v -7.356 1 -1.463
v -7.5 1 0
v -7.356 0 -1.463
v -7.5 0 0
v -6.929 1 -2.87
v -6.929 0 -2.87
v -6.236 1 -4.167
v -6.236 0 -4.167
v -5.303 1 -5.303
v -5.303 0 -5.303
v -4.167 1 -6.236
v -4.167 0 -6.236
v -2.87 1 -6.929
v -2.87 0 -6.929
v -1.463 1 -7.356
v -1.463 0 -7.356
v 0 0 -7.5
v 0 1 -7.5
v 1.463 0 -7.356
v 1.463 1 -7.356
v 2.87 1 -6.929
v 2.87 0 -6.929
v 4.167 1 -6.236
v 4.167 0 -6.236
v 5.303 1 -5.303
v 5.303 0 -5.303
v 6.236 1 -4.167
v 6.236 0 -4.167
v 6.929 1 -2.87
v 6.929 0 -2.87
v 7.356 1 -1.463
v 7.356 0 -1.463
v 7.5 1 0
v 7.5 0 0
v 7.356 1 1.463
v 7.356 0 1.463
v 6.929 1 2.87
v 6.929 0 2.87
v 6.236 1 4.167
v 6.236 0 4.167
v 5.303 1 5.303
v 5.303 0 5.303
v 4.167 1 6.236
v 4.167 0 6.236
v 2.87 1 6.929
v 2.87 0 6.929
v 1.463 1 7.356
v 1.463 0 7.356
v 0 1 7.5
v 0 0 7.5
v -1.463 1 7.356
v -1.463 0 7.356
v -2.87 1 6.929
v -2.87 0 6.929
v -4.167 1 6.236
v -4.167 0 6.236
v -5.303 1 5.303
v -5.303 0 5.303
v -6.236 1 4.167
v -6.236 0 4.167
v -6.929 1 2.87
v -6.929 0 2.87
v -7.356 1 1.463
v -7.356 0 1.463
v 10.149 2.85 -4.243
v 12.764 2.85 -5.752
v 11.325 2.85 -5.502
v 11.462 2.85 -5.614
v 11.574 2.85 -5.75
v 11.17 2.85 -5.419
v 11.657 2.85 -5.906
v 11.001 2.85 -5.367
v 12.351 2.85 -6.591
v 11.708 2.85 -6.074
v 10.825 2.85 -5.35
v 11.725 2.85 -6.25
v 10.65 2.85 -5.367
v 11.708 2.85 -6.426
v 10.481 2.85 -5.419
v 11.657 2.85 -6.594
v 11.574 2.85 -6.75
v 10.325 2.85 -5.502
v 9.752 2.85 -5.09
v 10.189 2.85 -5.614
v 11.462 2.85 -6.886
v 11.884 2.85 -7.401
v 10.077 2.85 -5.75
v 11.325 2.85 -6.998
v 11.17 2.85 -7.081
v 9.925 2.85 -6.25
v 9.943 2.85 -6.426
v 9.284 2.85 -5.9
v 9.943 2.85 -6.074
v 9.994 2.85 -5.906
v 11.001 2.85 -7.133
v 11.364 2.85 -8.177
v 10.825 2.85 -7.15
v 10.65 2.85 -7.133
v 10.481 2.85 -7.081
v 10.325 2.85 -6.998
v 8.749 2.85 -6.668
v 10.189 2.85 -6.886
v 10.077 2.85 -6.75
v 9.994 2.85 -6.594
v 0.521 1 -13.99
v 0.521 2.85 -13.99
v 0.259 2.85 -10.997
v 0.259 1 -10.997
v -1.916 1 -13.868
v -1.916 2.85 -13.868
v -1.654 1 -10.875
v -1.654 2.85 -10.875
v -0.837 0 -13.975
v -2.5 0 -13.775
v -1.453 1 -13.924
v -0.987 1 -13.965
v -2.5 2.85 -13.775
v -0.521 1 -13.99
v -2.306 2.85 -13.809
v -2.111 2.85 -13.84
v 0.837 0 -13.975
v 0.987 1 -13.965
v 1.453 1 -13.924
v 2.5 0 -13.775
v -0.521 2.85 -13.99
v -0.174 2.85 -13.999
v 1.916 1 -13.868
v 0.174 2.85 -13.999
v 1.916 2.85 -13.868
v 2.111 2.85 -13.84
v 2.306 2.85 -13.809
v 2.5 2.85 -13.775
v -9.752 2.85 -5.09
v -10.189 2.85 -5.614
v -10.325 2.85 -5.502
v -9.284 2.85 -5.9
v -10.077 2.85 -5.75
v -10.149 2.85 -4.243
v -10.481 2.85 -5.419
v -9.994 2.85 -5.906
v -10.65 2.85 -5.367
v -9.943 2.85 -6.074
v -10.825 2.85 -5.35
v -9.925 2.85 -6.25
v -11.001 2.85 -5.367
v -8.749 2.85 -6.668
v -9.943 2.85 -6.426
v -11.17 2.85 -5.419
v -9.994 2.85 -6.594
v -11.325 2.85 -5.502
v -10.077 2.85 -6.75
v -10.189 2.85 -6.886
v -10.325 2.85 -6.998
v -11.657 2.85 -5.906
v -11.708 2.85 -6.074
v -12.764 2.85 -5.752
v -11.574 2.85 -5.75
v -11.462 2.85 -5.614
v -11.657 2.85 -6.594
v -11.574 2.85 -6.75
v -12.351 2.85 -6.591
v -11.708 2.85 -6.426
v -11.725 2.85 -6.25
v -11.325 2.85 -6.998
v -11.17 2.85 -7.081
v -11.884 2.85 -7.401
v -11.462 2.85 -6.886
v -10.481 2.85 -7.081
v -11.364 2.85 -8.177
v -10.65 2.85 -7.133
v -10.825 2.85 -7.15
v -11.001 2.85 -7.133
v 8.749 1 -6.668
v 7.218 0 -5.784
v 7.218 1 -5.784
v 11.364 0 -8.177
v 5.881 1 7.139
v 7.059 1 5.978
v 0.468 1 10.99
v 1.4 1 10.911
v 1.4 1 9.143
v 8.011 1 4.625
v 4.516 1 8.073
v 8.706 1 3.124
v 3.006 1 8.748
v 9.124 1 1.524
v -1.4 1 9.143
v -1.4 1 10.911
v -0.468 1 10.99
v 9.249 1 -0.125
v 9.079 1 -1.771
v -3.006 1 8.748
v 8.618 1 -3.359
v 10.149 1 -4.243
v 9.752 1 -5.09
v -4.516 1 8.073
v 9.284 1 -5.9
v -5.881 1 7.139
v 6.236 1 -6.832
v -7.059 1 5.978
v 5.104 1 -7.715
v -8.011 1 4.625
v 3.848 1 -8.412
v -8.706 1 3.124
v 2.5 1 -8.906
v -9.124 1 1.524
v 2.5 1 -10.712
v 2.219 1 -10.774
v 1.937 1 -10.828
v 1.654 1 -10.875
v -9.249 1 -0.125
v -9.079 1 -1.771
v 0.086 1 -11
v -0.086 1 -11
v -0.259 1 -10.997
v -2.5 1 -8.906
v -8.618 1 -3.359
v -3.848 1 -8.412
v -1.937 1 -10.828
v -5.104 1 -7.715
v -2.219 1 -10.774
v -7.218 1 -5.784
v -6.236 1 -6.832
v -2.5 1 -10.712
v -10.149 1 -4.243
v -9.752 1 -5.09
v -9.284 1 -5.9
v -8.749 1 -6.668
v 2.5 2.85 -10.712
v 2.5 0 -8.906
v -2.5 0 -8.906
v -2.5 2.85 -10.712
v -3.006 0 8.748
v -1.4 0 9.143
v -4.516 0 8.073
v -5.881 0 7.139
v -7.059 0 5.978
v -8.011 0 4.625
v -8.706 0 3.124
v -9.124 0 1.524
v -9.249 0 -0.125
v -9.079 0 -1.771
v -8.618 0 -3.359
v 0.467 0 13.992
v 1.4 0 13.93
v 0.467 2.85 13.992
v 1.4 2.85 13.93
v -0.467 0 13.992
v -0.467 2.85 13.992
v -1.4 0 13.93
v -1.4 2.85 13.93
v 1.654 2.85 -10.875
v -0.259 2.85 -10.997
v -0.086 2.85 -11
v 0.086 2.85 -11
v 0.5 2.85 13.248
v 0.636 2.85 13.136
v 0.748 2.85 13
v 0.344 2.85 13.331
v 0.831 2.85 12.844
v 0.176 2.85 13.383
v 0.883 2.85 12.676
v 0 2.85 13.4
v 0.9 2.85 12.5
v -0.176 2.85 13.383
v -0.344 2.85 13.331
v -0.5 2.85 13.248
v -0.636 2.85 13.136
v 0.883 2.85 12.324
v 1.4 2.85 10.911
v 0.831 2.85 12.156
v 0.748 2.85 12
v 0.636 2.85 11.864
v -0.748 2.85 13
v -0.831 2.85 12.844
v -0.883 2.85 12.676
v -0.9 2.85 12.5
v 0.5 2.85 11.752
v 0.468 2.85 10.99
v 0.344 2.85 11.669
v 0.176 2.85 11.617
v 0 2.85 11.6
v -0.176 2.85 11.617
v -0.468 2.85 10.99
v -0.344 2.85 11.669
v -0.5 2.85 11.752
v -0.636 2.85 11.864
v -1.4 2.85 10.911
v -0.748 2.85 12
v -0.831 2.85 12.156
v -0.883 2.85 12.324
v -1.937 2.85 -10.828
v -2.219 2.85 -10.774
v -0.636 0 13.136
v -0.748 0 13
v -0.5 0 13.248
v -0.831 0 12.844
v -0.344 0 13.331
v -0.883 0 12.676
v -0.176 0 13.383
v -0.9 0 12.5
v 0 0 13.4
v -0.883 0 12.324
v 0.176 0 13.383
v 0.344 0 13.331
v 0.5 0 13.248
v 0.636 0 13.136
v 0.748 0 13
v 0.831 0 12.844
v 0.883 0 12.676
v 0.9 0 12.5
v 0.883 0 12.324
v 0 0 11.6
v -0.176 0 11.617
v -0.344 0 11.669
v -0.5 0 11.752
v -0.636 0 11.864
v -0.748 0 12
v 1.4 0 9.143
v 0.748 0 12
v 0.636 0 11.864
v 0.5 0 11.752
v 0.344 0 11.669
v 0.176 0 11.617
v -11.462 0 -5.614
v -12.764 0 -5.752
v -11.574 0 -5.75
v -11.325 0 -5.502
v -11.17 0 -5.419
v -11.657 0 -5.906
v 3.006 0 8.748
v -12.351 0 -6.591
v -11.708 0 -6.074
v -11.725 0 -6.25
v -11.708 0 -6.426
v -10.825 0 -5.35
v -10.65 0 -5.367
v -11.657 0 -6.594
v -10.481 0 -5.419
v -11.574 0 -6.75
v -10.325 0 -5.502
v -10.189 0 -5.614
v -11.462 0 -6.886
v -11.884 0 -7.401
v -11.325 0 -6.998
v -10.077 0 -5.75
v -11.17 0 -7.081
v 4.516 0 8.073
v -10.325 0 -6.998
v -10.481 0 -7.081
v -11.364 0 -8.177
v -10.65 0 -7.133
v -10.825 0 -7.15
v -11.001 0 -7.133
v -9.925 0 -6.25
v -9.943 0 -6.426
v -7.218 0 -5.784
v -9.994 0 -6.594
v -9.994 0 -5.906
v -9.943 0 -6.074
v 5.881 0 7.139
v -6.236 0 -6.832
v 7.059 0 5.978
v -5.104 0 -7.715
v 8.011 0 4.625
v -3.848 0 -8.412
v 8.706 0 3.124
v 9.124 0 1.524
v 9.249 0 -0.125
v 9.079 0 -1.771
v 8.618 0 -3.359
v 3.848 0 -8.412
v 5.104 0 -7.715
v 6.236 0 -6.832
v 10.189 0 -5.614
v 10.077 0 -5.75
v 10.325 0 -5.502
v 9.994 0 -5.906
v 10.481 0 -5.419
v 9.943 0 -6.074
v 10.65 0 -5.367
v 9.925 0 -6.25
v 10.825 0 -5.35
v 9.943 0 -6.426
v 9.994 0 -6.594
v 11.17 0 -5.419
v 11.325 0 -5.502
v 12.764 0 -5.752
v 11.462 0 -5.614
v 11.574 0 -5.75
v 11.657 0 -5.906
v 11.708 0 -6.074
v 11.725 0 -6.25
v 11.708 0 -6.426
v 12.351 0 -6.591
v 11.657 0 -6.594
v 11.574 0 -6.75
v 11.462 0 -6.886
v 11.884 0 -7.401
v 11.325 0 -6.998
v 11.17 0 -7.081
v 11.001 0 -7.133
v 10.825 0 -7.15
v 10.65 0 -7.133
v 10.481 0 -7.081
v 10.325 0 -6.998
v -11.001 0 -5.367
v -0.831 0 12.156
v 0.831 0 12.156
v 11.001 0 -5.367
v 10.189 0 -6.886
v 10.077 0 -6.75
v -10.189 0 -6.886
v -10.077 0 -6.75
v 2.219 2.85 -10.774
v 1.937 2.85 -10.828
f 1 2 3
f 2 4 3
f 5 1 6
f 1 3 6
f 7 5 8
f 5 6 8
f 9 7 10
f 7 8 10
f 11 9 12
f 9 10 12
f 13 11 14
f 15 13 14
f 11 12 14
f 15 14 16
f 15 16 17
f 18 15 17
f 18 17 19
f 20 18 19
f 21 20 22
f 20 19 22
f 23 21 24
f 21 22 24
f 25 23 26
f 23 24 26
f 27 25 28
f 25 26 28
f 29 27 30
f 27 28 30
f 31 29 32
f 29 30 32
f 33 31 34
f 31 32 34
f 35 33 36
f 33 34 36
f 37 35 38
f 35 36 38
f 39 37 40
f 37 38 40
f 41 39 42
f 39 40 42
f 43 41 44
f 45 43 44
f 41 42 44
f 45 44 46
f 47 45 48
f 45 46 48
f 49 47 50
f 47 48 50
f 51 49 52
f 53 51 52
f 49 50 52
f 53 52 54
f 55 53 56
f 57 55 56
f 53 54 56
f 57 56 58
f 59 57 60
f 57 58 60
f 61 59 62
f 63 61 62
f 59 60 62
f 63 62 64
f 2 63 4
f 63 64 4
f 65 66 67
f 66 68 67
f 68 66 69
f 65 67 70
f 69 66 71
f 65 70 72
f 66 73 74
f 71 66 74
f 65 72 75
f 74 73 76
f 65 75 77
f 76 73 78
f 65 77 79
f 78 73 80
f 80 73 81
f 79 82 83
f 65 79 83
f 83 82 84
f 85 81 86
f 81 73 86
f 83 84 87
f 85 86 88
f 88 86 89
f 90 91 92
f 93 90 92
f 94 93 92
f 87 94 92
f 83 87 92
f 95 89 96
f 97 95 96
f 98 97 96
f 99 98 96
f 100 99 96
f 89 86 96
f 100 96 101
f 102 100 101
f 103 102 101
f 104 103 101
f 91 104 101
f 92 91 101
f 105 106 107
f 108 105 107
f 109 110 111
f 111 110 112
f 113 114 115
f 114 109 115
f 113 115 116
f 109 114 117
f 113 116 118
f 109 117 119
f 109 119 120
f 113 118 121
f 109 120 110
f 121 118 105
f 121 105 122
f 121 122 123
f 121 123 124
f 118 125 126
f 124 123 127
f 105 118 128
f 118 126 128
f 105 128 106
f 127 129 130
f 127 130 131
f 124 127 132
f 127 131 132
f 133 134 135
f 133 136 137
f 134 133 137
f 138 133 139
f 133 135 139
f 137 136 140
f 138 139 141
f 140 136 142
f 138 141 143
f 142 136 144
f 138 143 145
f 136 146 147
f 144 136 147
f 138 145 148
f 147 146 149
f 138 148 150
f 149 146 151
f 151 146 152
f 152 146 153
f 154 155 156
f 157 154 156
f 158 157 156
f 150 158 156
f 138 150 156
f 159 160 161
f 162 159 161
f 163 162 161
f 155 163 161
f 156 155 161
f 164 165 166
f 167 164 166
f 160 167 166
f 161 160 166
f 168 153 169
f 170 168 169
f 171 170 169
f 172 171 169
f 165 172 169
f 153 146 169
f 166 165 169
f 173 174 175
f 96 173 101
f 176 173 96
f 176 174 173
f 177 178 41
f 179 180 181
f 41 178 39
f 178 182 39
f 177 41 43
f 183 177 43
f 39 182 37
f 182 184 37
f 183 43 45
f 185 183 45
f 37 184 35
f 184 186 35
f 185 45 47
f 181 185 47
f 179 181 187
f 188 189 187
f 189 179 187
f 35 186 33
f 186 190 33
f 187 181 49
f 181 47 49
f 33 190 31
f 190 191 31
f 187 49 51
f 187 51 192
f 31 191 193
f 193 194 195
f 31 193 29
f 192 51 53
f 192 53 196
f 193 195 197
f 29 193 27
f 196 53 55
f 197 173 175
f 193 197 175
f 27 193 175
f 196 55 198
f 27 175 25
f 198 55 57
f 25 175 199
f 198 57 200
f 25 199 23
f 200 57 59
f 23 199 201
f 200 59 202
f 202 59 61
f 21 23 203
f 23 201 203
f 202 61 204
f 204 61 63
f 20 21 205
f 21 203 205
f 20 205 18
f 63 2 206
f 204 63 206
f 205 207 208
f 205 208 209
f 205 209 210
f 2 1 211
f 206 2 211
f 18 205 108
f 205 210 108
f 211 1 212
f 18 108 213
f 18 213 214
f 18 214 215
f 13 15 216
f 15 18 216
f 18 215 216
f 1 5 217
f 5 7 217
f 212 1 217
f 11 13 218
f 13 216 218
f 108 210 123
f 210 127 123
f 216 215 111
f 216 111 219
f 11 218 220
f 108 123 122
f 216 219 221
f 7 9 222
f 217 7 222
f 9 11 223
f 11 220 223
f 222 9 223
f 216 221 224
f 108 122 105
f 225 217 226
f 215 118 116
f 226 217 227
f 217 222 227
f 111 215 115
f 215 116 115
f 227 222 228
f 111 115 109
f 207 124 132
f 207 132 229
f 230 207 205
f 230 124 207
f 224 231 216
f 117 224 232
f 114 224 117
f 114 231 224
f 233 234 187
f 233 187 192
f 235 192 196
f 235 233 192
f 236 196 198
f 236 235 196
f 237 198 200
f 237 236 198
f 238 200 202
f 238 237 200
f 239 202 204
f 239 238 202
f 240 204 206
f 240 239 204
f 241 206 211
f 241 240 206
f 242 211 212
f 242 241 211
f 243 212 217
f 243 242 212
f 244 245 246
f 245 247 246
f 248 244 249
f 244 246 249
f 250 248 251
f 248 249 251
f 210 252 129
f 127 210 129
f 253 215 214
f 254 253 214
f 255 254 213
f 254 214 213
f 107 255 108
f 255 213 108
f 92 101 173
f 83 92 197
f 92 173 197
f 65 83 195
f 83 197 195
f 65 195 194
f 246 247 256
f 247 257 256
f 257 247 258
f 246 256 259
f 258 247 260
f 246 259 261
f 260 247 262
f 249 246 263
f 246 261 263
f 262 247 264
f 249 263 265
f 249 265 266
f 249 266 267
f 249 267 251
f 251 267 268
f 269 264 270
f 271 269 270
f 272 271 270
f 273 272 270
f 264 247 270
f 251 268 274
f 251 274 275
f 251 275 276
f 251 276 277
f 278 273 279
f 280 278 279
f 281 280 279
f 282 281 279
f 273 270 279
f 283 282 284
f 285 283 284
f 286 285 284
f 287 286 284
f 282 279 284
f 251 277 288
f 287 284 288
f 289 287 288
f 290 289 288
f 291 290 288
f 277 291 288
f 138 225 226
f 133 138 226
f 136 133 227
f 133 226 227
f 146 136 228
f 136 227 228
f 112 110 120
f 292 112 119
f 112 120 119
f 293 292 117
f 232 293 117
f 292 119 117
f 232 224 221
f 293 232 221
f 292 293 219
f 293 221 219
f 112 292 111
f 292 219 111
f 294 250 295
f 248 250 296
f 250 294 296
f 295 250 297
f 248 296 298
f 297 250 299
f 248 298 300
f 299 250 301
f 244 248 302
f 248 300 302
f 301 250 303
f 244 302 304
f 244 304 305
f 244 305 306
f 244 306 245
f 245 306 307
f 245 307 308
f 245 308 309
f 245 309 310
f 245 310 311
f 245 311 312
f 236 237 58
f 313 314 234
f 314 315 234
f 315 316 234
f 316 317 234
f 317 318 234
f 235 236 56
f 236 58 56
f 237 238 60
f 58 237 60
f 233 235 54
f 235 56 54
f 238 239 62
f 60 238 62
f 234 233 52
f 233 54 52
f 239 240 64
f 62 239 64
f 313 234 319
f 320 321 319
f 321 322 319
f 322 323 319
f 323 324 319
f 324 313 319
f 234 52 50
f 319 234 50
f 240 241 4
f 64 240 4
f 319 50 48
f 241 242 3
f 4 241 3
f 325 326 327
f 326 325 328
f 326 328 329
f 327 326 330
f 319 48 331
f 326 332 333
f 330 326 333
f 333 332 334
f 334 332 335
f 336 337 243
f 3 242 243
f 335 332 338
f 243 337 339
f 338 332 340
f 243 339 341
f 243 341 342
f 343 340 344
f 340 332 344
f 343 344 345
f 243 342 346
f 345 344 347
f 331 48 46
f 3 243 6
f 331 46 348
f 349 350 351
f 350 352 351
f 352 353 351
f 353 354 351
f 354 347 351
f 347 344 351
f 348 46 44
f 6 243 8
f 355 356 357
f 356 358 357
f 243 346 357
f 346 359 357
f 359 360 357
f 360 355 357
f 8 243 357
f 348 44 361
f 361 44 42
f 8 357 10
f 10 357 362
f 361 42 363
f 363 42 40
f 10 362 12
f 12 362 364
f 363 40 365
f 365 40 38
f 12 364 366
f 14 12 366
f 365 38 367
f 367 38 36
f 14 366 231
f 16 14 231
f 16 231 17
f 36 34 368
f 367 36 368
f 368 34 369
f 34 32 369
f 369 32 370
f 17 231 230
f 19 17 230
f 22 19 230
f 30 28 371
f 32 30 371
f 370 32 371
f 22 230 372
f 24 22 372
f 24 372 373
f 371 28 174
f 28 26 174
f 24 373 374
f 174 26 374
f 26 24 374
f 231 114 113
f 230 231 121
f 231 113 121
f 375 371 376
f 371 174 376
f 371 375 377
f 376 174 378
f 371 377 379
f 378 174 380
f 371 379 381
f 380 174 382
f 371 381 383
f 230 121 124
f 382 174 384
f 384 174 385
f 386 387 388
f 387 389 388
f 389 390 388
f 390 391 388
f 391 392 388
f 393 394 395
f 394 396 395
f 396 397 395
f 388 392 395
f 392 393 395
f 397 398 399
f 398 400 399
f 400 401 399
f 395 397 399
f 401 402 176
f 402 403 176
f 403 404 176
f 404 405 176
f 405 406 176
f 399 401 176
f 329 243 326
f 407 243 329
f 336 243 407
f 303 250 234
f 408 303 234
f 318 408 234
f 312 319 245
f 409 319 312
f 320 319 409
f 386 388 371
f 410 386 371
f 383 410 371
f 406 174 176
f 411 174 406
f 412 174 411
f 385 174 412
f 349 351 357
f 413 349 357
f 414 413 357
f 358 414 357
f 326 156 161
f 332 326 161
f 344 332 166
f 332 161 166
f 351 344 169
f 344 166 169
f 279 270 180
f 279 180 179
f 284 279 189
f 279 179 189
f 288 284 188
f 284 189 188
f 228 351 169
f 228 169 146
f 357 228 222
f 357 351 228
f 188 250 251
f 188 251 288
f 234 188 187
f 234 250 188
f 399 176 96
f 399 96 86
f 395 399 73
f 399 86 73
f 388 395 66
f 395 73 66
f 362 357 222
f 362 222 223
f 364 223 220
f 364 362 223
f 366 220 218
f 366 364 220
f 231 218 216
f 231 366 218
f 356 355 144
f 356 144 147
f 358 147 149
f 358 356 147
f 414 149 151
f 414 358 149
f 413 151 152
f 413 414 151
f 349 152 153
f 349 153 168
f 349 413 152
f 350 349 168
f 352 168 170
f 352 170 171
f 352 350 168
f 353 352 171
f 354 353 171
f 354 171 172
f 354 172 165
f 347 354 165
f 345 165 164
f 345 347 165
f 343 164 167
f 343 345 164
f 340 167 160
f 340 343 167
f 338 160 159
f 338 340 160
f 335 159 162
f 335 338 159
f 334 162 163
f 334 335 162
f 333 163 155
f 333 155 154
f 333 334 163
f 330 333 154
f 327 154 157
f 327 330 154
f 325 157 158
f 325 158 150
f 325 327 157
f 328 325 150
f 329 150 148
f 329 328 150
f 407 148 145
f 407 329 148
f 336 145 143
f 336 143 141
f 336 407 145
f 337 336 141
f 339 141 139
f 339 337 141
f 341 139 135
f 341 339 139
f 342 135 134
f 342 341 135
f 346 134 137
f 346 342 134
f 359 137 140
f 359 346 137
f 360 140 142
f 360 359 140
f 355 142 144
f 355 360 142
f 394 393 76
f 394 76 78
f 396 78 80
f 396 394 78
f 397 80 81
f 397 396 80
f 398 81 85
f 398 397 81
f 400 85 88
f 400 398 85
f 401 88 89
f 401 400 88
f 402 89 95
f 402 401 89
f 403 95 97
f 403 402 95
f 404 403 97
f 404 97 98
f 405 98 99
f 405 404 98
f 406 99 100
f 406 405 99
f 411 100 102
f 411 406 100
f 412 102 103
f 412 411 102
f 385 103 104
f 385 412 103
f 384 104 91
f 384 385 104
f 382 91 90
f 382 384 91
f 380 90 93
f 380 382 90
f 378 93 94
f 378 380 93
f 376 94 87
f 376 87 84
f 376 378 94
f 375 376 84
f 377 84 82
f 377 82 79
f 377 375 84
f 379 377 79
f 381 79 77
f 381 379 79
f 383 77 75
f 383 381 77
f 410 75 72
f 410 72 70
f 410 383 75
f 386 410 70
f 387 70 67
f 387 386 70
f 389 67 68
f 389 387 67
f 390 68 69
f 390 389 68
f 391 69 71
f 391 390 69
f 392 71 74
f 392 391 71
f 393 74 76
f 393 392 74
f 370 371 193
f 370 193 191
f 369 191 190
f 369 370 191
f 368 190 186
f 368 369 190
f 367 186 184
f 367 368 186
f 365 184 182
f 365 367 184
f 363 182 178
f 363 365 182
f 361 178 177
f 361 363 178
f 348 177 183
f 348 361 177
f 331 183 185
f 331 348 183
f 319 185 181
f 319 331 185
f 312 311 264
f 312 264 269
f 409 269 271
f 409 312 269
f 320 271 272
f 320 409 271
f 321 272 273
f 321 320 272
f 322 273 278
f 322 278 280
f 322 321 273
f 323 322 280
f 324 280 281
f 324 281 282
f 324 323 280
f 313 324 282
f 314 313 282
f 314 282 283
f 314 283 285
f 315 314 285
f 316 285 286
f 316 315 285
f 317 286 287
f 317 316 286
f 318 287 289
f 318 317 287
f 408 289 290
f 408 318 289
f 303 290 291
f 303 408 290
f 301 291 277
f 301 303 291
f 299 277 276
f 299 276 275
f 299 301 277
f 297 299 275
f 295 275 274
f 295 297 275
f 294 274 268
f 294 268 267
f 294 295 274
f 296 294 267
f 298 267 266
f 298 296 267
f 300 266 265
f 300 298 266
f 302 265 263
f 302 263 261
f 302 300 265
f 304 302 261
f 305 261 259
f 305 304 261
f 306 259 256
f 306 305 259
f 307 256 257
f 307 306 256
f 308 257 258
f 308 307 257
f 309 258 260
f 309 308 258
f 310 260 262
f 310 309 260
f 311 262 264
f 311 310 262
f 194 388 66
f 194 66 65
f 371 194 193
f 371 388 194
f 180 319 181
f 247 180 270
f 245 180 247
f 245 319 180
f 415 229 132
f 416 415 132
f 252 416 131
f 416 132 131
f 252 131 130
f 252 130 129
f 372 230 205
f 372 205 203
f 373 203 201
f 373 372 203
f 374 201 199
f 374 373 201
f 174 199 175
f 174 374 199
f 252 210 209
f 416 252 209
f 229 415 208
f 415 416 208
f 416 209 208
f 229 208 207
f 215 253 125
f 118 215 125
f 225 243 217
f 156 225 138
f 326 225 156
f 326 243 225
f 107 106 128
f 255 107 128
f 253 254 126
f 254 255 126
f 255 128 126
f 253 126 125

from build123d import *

# Parameters (mm, degrees)
CUT_EXTRUDE1_DEPTH     = 1.85
CUT_EXTRUDE2_START     = -2.85
CUT_EXTRUDE2_OUTLINE_R = 0.9
CUT_EXTRUDE2_DEPTH     = 2.85


# Read off the part's stored shape, not the designer's step: Cut-Extrude2
with BuildPart() as part:
    # Sketch1 → Revolve1 (revolve)
    with BuildSketch(Plane.XY, mode=Mode.PRIVATE) as revolve1_sk:
        Polygon((7.5, 0.9999999999999996), (7.5, 0), (14.000000000000002, 0), (14.000000000000002, 2.8500000000000005), (11.000000000000002, 2.85), (11.000000000000002, 1), align=None)
    revolve(revolve1_sk.sketch.rotate(Axis((3e-17, 0.9999999999999987, 0), (-3e-17, -1, 0)), 180), axis=Axis((3e-17, 0.9999999999999987, 0), (-3e-17, -1, 0)))

    # Sketch2 → Cut-Extrude1 (cut)
    with BuildSketch(Plane(origin=(9e-17, 2.8500000000000005, 0), x_dir=(1, -3e-17, 0), z_dir=(3e-17, 1, 0))):
        with BuildLine():
            ThreePointArc((0.259433716221758, 10.996940217482653), (0.6093823027349546, 10.983107629861117), (0.9587131702244344, 10.958141679009186))
            Line((0.9587131702242476, 10.9581416790092), (1.2201803984672228, 13.946725773284436))
            ThreePointArc((1.2201803984672233, 13.946725773284438), (0.8710215713285331, 13.97287806510457), (0.521317929845157, 13.99029047647053))
            Line((0.5213179298455201, 13.99029047647048), (0.25943371622169603, 10.996940217482662))
        make_face()
        with BuildLine():
            Line((1.2201803984672228, 13.946725773284436), (0.9587131702242476, 10.9581416790092))
            ThreePointArc((0.9587131702244344, 10.958141679009186), (1.3070722087636013, 10.922067672427135), (1.6541062935502489, 10.874922177635916))
            Line((1.6541062935501436, 10.874922177635918), (1.9159905071739696, 13.868272436623787))
            ThreePointArc((1.9159905071740335, 13.868272436623785), (1.5685760162822768, 13.911849958979003), (1.2201803984672233, 13.946725773284438))
        make_face()
        with BuildLine():
            Line((-1.9159905071739802, 13.868272436623787), (-1.654106293550152, 10.874922177635916))
            ThreePointArc((-1.654106293550262, 10.874922177635913), (-0.9587131702243502, 10.958141679009193), (-0.25943371622180056, 10.996940217482653))
            Line((-0.259433716221705, 10.996940217482667), (-0.5213179298455309, 13.990290476470479))
            ThreePointArc((-0.5213179298451552, 13.99029047647053), (-0.8710219940751529, 13.97287803875198), (-1.2201812423779956, 13.946725699451788))
            ThreePointArc((-1.2201812423779956, 13.946725699451788), (-1.5685764371825126, 13.911849911522042), (-1.9159905071740533, 13.868272436623784))
        make_face()
    extrude(amount=-CUT_EXTRUDE1_DEPTH, mode=Mode.SUBTRACT)

    # Cut-Extrude2 outline → Cut-Extrude2 (cut)
    with BuildSketch(Plane(origin=(9e-17, 2.8500000000000005, 0), x_dir=(1, -3e-17, 0), z_dir=(3e-17, 1, 0)).offset(CUT_EXTRUDE2_START)):
        with BuildLine():
            ThreePointArc((8.618451553, 3.35928457), (8.010734985, -4.625), (1.4, -9.143440272))
            Line((1.4, -9.143440272), (1.4, -13.929824119))
            ThreePointArc((1.4, -13.929824119), (12.124355653, -7), (12.763581558, 5.752476494))
            Line((12.763581558, 5.752476494), (8.618451553, 3.35928457))
        make_face()
        with BuildLine():
            Line((-8.618451553, 3.35928457), (-12.763581558, 5.752476494))
            ThreePointArc((-12.763581558, 5.752476494), (-12.124355653, -7), (-1.4, -13.929824119))
            Line((-1.4, -13.929824119), (-1.4, -9.143440272))
            ThreePointArc((-1.4, -9.143440272), (-8.010734985, -4.625), (-8.618451553, 3.35928457))
        make_face()
        with BuildLine():
            Line((2.5, 13.774977314), (2.5, 8.905756565))
            ThreePointArc((2.5, 8.905756565), (5.103741092, 7.714552927), (7.218451553, 5.784155701))
            Line((7.218451553, 5.784155701), (11.363581558, 8.177347625))
            ThreePointArc((11.363581558, 8.177347625), (7.475499176, 11.837098972), (2.5, 13.774977314))
        make_face()
        with BuildLine():
            Line((-2.5, 8.905756565), (-2.5, 13.774977314))
            ThreePointArc((-2.5, 13.774977314), (-7.475499176, 11.837098972), (-11.363581558, 8.177347625))
            Line((-11.363581558, 8.177347625), (-7.218451553, 5.784155701))
            ThreePointArc((-7.218451553, 5.784155701), (-5.103741092, 7.714552927), (-2.5, 8.905756565))
        make_face()
        with Locations((-10.825317547, 6.25)):
            Circle(CUT_EXTRUDE2_OUTLINE_R)
        with Locations((0, -12.5)):
            Circle(CUT_EXTRUDE2_OUTLINE_R)
        with Locations((10.825317547, 6.25)):
            Circle(CUT_EXTRUDE2_OUTLINE_R)
    extrude(amount=CUT_EXTRUDE2_DEPTH, mode=Mode.SUBTRACT)


solid = part.part
